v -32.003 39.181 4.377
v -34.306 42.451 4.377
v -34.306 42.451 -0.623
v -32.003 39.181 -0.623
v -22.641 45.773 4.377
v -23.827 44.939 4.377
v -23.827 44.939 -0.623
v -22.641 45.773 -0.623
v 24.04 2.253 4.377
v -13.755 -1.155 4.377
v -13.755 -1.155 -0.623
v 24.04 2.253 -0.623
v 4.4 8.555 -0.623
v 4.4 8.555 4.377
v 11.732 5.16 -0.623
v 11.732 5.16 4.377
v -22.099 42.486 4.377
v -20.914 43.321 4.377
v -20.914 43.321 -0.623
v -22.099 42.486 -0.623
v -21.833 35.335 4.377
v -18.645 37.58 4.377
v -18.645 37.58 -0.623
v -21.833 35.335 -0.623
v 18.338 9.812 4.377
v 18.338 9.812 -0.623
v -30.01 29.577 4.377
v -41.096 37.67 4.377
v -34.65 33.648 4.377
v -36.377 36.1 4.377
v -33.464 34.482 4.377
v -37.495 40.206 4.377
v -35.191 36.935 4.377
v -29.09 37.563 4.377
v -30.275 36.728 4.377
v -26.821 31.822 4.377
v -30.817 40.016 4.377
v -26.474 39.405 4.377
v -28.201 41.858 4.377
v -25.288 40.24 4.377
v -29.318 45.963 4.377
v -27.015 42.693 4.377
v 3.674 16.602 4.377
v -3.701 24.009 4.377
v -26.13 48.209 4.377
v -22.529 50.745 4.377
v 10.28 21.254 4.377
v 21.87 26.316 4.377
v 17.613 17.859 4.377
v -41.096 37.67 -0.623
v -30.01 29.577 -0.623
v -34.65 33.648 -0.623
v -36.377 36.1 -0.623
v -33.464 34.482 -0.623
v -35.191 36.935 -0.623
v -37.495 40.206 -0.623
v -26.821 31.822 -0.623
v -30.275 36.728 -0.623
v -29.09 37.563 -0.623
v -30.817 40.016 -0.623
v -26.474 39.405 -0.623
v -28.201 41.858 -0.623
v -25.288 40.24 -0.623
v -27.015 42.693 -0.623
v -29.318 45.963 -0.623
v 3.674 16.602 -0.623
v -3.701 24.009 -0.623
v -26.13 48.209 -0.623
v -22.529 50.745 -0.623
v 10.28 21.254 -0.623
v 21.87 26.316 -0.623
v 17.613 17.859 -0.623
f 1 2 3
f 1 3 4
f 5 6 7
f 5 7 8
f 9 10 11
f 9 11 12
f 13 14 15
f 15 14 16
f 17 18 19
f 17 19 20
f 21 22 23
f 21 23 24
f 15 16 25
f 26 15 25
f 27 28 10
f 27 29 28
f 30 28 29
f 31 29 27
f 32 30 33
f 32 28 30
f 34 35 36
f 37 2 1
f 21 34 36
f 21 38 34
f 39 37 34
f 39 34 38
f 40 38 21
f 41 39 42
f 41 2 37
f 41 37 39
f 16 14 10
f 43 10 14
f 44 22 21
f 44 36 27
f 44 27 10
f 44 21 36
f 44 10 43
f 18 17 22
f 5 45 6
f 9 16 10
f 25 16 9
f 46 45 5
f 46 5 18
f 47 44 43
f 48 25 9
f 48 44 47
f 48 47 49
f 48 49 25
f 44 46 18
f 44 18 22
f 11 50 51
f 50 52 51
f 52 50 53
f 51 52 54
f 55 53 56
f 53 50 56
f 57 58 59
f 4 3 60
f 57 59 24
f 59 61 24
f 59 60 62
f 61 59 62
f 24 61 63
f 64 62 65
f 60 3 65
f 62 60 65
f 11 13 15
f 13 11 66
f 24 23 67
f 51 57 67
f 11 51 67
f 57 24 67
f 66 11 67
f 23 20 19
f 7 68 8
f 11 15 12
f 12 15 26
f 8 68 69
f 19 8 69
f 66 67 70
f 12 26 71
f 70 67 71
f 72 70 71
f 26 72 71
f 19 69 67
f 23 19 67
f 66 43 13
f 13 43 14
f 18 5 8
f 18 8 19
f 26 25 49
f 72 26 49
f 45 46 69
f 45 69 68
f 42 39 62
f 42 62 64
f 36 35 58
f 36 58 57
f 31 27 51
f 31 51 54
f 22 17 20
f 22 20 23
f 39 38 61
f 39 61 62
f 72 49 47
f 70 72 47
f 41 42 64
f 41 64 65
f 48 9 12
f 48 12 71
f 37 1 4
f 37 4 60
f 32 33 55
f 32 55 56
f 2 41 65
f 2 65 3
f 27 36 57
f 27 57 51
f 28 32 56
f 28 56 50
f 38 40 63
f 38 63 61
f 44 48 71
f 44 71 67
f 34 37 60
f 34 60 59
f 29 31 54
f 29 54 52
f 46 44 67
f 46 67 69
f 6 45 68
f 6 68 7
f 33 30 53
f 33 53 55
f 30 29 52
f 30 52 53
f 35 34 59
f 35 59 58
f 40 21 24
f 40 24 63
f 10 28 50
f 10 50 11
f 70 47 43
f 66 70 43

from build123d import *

# Parameters (mm, degrees)
BOSS_EXTRUDE1_DEPTH = 5


with BuildPart() as part:
    # Sketch3 → Boss-Extrude1 (new body)
    with BuildSketch(Plane.XY.offset(4.376601216)):
        Polygon((-41.095887165, 37.669622361), (-13.754633765, -1.155465661), (24.040364141, 2.253439084), (21.87007244, 26.315763035), (-3.700822745, 24.009406354), (-22.528508458, 50.745070018), (-26.12981396, 48.208972579), (-23.826719635, 44.93853583), (-22.641186314, 45.773407523), (-20.91386557, 43.320579961), (-22.099398891, 42.485708268), (-18.644757404, 37.580053144), (-21.833433235, 35.334536178), (-25.288074722, 40.240191301), (-26.473608044, 39.405319609), (-28.200928787, 41.85814717), (-27.015395466, 42.693018863), (-29.318489791, 45.963455612), (-34.305905833, 42.451236767), (-32.002811508, 39.180800018), (-30.817278187, 40.015671711), (-29.089957443, 37.562844149), (-30.275490764, 36.727972456), (-26.820849277, 31.822317332), (-30.009525108, 29.576800365), (-33.464166595, 34.482455489), (-34.649699917, 33.647583796), (-36.37702066, 36.100411358), (-35.191487339, 36.935283051), (-37.494581664, 40.2057198), align=None)
        Polygon((3.674129189, 16.601950475), (4.399955221, 8.554616968), (11.732063487, 5.159533997), (18.338345721, 9.811784534), (17.612519688, 17.859118041), (10.280411422, 21.254201011), align=None, mode=Mode.SUBTRACT)
    extrude(amount=-BOSS_EXTRUDE1_DEPTH)


solid = part.part
